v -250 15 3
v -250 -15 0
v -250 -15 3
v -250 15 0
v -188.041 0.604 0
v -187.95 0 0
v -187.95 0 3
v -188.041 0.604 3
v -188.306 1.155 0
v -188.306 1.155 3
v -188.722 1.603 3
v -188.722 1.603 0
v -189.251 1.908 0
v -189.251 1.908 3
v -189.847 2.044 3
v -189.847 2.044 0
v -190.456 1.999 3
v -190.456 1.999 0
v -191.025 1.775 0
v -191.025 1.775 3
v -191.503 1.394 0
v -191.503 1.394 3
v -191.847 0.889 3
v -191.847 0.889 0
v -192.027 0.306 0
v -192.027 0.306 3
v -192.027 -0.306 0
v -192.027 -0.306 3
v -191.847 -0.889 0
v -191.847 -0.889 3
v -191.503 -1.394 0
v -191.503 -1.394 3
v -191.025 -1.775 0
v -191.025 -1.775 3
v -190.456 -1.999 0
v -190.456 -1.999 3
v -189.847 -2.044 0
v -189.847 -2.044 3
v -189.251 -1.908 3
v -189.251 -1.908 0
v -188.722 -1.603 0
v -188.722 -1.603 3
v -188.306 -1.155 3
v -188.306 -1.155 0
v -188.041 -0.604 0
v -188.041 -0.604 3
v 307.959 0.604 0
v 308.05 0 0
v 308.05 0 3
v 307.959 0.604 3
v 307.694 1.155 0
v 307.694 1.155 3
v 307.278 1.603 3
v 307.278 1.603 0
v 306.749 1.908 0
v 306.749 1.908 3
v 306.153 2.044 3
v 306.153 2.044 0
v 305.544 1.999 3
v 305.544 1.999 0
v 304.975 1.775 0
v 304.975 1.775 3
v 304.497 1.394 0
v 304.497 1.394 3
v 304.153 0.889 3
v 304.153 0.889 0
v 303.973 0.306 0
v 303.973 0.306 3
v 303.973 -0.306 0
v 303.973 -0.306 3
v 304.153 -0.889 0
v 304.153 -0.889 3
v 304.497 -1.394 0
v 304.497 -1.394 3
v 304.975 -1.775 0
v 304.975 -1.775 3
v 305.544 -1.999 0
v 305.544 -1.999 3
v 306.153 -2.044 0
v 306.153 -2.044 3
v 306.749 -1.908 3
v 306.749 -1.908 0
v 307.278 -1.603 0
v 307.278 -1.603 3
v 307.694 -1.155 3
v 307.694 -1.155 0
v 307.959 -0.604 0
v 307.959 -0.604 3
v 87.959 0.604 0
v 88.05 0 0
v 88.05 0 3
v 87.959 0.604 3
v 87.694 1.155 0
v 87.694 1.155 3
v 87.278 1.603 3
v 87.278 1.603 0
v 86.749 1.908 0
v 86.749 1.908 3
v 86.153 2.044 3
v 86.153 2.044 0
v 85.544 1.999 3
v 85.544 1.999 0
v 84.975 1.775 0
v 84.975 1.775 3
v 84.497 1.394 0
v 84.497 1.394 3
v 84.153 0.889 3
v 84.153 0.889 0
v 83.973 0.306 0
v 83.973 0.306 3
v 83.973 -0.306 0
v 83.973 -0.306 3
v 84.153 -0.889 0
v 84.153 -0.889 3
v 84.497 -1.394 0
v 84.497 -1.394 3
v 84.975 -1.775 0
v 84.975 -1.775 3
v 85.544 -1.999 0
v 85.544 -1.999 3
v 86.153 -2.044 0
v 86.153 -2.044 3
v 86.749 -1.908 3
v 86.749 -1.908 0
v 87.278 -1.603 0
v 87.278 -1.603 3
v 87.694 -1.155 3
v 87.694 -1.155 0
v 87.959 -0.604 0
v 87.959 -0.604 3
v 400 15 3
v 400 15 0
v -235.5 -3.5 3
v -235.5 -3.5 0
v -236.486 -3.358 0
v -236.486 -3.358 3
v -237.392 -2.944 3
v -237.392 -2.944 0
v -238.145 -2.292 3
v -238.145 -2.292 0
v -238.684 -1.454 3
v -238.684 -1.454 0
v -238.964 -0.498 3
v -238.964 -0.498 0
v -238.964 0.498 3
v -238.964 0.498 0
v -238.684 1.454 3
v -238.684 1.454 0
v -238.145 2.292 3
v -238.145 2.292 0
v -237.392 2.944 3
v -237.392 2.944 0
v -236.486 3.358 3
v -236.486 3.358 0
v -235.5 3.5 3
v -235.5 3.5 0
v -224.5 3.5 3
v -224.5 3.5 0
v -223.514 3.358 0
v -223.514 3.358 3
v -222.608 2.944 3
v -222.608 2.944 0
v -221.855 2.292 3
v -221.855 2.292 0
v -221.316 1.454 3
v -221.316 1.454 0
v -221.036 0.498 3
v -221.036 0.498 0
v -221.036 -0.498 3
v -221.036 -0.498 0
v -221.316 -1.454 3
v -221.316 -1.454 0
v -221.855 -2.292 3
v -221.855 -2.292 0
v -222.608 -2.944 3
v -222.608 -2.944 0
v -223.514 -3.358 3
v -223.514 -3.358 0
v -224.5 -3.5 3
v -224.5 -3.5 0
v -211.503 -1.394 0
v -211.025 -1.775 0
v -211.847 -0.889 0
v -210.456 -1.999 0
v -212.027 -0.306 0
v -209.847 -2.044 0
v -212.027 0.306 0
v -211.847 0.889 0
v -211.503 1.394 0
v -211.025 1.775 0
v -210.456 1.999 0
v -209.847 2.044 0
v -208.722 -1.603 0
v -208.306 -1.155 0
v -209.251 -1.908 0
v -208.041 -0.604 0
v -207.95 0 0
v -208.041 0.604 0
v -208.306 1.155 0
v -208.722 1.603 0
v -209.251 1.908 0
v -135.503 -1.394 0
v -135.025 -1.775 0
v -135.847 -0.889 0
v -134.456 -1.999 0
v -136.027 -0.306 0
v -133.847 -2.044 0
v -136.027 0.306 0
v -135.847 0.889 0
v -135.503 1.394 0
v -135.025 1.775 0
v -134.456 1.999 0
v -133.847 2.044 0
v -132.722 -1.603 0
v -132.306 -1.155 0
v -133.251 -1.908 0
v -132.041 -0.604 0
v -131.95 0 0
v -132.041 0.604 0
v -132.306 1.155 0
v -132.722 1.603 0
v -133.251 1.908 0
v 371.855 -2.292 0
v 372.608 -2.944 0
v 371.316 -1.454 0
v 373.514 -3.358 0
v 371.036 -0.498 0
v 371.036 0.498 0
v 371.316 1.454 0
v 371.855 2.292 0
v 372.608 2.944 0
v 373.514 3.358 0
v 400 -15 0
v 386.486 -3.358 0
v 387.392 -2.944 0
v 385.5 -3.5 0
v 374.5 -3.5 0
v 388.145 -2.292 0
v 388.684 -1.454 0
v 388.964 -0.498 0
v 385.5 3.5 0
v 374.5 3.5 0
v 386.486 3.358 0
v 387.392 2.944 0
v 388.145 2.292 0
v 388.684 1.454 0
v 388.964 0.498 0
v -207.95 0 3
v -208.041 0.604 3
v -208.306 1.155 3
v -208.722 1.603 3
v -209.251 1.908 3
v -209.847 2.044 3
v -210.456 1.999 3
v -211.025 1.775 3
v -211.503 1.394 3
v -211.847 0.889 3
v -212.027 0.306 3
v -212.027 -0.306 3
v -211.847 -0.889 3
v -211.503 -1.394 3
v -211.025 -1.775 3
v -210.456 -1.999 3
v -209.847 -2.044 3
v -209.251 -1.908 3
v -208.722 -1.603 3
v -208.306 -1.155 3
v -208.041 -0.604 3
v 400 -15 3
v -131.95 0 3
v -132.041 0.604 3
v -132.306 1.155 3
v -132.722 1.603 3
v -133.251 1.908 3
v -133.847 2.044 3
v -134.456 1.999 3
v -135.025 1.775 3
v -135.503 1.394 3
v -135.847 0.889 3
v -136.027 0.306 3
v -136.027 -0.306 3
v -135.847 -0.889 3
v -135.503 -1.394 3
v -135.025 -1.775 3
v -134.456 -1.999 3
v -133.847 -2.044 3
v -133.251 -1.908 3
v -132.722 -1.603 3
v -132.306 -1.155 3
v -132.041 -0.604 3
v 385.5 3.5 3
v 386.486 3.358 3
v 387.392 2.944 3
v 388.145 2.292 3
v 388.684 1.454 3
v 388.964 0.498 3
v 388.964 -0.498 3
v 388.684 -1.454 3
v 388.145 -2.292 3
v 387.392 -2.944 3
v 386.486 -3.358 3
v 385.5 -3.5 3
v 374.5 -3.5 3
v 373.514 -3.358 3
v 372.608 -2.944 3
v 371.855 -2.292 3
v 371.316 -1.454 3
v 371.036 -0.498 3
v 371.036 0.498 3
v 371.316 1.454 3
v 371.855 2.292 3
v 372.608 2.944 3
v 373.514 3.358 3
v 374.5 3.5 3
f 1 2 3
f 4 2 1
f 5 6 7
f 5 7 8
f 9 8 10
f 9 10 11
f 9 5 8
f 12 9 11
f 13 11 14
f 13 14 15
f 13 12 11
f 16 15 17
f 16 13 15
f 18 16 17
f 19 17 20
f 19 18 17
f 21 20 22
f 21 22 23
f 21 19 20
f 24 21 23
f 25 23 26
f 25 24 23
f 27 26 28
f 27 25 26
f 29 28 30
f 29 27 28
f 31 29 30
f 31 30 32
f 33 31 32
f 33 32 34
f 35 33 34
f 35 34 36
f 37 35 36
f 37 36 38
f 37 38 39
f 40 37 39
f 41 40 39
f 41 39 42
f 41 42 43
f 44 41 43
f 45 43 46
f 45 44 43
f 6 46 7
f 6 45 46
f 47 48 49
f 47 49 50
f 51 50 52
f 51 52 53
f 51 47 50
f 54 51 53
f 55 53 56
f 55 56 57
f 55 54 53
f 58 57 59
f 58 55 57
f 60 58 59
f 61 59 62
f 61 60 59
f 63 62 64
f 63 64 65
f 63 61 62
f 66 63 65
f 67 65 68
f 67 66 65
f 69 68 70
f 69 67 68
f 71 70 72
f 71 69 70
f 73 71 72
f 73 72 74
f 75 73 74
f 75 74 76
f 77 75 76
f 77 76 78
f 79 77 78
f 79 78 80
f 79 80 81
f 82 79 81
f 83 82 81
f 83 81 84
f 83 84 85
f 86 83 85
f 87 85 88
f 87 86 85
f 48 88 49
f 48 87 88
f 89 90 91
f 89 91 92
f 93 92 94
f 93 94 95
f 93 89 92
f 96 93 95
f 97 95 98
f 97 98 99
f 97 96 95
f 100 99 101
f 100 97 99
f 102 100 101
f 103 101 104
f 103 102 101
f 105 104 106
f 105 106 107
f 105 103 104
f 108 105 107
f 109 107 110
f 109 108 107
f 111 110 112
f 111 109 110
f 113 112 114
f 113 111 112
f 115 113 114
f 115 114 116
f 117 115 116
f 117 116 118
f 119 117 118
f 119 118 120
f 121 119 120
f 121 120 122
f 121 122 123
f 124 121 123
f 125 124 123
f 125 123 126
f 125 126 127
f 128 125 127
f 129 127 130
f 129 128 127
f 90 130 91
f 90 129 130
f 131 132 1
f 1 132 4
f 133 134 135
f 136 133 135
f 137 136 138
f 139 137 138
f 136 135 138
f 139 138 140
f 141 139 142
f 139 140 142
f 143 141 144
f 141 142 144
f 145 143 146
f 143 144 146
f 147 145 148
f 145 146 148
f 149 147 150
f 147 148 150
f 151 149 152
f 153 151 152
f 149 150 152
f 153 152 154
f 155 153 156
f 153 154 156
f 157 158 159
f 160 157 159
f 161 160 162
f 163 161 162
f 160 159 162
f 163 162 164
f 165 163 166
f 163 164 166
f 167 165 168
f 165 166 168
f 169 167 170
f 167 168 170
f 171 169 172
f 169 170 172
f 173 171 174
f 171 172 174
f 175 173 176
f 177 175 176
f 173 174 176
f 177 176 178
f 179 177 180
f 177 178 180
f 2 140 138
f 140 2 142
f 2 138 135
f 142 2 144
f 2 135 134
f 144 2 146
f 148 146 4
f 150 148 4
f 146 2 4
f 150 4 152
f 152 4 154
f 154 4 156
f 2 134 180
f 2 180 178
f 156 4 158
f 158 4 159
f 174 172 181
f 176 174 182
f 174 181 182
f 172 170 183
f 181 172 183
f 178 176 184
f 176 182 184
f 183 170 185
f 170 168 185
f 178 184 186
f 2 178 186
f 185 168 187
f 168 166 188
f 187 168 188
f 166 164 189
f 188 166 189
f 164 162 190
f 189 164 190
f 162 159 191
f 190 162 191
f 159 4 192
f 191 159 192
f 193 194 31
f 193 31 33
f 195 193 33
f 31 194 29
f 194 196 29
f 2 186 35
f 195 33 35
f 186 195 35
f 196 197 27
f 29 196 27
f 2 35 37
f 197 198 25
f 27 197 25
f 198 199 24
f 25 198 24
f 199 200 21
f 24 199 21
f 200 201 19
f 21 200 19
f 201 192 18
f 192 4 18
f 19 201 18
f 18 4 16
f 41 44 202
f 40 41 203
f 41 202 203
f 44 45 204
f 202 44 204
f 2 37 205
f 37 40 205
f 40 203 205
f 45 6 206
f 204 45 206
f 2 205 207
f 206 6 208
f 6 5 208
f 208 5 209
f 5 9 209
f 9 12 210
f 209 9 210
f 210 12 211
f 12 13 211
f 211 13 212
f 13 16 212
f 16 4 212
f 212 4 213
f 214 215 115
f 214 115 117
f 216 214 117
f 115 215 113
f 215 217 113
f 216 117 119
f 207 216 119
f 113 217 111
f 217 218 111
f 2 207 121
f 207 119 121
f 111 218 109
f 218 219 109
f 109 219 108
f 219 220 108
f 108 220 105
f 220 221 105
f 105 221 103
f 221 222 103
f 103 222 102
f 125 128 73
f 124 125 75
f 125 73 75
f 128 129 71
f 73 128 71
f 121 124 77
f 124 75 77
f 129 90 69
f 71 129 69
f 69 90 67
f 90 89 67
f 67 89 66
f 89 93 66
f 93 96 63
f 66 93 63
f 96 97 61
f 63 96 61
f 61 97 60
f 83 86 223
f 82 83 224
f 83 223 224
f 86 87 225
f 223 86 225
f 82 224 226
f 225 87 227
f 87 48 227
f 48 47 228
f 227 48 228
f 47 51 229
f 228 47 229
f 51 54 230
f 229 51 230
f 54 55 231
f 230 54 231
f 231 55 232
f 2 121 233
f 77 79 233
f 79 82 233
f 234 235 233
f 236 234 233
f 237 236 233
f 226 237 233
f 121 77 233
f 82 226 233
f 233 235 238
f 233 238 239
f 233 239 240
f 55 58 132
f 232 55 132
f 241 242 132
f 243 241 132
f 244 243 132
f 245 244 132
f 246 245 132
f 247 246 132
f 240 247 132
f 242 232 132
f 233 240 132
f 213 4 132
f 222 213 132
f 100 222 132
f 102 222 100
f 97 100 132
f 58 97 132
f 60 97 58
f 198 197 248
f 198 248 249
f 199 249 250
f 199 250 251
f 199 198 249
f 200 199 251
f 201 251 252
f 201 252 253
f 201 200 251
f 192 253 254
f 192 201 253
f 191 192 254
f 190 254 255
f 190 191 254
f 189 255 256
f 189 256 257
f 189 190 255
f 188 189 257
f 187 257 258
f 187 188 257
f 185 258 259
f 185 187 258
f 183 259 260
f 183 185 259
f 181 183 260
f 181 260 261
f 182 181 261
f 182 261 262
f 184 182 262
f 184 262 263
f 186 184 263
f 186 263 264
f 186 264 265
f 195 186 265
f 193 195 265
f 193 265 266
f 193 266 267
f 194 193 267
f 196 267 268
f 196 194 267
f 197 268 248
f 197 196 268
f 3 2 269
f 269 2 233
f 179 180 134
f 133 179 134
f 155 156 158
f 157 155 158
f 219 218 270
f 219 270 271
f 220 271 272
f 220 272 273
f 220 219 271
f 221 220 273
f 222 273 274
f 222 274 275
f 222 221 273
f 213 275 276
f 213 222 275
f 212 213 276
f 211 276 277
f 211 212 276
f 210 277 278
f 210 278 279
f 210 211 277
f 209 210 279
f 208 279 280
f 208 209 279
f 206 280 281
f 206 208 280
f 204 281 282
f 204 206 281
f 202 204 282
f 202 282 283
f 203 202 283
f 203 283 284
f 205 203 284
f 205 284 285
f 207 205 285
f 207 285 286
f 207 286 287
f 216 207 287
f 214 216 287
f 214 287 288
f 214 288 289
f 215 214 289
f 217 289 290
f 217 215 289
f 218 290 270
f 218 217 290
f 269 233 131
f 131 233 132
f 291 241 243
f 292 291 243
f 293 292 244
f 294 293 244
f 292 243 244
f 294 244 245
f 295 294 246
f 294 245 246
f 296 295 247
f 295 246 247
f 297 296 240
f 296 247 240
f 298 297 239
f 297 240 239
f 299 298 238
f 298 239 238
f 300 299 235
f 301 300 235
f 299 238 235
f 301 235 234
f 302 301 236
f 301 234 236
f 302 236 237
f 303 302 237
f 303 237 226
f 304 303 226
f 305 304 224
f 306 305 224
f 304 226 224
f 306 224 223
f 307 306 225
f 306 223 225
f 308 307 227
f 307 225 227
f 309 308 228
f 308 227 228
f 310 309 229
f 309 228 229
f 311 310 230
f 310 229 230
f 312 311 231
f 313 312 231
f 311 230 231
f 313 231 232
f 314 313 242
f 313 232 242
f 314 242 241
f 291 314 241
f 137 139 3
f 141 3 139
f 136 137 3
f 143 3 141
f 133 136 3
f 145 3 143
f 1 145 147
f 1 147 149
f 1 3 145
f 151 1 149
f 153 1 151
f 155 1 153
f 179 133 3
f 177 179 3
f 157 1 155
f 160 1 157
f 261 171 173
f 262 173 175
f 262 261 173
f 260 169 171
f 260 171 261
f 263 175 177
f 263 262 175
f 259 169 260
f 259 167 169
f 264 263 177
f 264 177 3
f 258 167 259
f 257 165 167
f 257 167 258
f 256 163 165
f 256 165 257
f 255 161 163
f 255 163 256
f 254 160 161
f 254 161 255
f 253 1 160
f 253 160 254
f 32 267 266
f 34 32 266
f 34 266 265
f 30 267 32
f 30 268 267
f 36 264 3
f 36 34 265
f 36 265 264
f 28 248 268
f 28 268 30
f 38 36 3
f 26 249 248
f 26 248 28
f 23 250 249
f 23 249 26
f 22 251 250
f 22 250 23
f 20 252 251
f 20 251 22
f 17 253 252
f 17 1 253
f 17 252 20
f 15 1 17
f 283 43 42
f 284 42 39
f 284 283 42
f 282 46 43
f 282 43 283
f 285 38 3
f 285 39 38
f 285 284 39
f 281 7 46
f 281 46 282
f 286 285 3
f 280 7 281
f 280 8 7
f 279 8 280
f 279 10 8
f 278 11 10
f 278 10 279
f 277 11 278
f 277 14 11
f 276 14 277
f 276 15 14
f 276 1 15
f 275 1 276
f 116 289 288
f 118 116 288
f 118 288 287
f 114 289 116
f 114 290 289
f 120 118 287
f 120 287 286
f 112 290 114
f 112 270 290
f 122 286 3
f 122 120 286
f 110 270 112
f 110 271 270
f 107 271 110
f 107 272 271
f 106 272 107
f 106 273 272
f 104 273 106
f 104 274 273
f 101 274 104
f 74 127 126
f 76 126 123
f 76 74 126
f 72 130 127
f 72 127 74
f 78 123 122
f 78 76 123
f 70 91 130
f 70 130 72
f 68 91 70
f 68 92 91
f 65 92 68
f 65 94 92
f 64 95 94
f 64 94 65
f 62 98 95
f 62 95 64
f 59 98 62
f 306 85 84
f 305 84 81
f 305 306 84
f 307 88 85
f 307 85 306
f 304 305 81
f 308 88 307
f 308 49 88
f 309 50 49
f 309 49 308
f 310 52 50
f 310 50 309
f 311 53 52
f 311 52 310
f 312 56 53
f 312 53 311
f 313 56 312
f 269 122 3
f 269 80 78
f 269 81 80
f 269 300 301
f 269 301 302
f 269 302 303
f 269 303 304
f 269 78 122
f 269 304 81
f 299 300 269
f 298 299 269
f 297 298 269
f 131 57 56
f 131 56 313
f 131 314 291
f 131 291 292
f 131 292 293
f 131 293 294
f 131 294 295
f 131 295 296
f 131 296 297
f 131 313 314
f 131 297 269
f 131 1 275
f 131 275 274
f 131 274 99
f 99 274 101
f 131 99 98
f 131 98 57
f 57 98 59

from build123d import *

# Parameters (mm, degrees)
F0_W     = 500
F0_H     = 30
F0_R     = 2.05
F0_W_2   = 150
F1_DEPTH = 3


with BuildPart() as f1:
    # F0 (on Top) → F1 (new body)
    with BuildSketch(Plane.XY):
        Rectangle(F0_W, F0_H)
        with BuildLine():
            ThreePointArc((-224.5, 3.5), (-221, 0), (-224.5, -3.5))
            Line((-224.5, -3.5), (-235.5, -3.5))
            ThreePointArc((-235.5, -3.5), (-239, 0), (-235.5, 3.5))
            Line((-235.5, 3.5), (-224.5, 3.5))
        make_face(mode=Mode.SUBTRACT)
        with Locations((-210, 0)):
            Circle(F0_R, mode=Mode.SUBTRACT)
        with Locations((-190, 0)):
            Circle(F0_R, mode=Mode.SUBTRACT)
        with Locations((-134, 0)):
            Circle(F0_R, mode=Mode.SUBTRACT)
        with Locations((86, 0)):
            Circle(F0_R, mode=Mode.SUBTRACT)
        with Locations((325, 0)):
            Rectangle(F0_W_2, F0_H)
        with Locations((306, 0)):
            Circle(F0_R, mode=Mode.SUBTRACT)
        with BuildLine():
            ThreePointArc((385.5, 3.5), (389, 0), (385.5, -3.5))
            Line((385.5, -3.5), (374.5, -3.5))
            ThreePointArc((374.5, -3.5), (371, 0), (374.5, 3.5))
            Line((374.5, 3.5), (385.5, 3.5))
        make_face(mode=Mode.SUBTRACT)
    extrude(amount=F1_DEPTH)


solid = f1.part
